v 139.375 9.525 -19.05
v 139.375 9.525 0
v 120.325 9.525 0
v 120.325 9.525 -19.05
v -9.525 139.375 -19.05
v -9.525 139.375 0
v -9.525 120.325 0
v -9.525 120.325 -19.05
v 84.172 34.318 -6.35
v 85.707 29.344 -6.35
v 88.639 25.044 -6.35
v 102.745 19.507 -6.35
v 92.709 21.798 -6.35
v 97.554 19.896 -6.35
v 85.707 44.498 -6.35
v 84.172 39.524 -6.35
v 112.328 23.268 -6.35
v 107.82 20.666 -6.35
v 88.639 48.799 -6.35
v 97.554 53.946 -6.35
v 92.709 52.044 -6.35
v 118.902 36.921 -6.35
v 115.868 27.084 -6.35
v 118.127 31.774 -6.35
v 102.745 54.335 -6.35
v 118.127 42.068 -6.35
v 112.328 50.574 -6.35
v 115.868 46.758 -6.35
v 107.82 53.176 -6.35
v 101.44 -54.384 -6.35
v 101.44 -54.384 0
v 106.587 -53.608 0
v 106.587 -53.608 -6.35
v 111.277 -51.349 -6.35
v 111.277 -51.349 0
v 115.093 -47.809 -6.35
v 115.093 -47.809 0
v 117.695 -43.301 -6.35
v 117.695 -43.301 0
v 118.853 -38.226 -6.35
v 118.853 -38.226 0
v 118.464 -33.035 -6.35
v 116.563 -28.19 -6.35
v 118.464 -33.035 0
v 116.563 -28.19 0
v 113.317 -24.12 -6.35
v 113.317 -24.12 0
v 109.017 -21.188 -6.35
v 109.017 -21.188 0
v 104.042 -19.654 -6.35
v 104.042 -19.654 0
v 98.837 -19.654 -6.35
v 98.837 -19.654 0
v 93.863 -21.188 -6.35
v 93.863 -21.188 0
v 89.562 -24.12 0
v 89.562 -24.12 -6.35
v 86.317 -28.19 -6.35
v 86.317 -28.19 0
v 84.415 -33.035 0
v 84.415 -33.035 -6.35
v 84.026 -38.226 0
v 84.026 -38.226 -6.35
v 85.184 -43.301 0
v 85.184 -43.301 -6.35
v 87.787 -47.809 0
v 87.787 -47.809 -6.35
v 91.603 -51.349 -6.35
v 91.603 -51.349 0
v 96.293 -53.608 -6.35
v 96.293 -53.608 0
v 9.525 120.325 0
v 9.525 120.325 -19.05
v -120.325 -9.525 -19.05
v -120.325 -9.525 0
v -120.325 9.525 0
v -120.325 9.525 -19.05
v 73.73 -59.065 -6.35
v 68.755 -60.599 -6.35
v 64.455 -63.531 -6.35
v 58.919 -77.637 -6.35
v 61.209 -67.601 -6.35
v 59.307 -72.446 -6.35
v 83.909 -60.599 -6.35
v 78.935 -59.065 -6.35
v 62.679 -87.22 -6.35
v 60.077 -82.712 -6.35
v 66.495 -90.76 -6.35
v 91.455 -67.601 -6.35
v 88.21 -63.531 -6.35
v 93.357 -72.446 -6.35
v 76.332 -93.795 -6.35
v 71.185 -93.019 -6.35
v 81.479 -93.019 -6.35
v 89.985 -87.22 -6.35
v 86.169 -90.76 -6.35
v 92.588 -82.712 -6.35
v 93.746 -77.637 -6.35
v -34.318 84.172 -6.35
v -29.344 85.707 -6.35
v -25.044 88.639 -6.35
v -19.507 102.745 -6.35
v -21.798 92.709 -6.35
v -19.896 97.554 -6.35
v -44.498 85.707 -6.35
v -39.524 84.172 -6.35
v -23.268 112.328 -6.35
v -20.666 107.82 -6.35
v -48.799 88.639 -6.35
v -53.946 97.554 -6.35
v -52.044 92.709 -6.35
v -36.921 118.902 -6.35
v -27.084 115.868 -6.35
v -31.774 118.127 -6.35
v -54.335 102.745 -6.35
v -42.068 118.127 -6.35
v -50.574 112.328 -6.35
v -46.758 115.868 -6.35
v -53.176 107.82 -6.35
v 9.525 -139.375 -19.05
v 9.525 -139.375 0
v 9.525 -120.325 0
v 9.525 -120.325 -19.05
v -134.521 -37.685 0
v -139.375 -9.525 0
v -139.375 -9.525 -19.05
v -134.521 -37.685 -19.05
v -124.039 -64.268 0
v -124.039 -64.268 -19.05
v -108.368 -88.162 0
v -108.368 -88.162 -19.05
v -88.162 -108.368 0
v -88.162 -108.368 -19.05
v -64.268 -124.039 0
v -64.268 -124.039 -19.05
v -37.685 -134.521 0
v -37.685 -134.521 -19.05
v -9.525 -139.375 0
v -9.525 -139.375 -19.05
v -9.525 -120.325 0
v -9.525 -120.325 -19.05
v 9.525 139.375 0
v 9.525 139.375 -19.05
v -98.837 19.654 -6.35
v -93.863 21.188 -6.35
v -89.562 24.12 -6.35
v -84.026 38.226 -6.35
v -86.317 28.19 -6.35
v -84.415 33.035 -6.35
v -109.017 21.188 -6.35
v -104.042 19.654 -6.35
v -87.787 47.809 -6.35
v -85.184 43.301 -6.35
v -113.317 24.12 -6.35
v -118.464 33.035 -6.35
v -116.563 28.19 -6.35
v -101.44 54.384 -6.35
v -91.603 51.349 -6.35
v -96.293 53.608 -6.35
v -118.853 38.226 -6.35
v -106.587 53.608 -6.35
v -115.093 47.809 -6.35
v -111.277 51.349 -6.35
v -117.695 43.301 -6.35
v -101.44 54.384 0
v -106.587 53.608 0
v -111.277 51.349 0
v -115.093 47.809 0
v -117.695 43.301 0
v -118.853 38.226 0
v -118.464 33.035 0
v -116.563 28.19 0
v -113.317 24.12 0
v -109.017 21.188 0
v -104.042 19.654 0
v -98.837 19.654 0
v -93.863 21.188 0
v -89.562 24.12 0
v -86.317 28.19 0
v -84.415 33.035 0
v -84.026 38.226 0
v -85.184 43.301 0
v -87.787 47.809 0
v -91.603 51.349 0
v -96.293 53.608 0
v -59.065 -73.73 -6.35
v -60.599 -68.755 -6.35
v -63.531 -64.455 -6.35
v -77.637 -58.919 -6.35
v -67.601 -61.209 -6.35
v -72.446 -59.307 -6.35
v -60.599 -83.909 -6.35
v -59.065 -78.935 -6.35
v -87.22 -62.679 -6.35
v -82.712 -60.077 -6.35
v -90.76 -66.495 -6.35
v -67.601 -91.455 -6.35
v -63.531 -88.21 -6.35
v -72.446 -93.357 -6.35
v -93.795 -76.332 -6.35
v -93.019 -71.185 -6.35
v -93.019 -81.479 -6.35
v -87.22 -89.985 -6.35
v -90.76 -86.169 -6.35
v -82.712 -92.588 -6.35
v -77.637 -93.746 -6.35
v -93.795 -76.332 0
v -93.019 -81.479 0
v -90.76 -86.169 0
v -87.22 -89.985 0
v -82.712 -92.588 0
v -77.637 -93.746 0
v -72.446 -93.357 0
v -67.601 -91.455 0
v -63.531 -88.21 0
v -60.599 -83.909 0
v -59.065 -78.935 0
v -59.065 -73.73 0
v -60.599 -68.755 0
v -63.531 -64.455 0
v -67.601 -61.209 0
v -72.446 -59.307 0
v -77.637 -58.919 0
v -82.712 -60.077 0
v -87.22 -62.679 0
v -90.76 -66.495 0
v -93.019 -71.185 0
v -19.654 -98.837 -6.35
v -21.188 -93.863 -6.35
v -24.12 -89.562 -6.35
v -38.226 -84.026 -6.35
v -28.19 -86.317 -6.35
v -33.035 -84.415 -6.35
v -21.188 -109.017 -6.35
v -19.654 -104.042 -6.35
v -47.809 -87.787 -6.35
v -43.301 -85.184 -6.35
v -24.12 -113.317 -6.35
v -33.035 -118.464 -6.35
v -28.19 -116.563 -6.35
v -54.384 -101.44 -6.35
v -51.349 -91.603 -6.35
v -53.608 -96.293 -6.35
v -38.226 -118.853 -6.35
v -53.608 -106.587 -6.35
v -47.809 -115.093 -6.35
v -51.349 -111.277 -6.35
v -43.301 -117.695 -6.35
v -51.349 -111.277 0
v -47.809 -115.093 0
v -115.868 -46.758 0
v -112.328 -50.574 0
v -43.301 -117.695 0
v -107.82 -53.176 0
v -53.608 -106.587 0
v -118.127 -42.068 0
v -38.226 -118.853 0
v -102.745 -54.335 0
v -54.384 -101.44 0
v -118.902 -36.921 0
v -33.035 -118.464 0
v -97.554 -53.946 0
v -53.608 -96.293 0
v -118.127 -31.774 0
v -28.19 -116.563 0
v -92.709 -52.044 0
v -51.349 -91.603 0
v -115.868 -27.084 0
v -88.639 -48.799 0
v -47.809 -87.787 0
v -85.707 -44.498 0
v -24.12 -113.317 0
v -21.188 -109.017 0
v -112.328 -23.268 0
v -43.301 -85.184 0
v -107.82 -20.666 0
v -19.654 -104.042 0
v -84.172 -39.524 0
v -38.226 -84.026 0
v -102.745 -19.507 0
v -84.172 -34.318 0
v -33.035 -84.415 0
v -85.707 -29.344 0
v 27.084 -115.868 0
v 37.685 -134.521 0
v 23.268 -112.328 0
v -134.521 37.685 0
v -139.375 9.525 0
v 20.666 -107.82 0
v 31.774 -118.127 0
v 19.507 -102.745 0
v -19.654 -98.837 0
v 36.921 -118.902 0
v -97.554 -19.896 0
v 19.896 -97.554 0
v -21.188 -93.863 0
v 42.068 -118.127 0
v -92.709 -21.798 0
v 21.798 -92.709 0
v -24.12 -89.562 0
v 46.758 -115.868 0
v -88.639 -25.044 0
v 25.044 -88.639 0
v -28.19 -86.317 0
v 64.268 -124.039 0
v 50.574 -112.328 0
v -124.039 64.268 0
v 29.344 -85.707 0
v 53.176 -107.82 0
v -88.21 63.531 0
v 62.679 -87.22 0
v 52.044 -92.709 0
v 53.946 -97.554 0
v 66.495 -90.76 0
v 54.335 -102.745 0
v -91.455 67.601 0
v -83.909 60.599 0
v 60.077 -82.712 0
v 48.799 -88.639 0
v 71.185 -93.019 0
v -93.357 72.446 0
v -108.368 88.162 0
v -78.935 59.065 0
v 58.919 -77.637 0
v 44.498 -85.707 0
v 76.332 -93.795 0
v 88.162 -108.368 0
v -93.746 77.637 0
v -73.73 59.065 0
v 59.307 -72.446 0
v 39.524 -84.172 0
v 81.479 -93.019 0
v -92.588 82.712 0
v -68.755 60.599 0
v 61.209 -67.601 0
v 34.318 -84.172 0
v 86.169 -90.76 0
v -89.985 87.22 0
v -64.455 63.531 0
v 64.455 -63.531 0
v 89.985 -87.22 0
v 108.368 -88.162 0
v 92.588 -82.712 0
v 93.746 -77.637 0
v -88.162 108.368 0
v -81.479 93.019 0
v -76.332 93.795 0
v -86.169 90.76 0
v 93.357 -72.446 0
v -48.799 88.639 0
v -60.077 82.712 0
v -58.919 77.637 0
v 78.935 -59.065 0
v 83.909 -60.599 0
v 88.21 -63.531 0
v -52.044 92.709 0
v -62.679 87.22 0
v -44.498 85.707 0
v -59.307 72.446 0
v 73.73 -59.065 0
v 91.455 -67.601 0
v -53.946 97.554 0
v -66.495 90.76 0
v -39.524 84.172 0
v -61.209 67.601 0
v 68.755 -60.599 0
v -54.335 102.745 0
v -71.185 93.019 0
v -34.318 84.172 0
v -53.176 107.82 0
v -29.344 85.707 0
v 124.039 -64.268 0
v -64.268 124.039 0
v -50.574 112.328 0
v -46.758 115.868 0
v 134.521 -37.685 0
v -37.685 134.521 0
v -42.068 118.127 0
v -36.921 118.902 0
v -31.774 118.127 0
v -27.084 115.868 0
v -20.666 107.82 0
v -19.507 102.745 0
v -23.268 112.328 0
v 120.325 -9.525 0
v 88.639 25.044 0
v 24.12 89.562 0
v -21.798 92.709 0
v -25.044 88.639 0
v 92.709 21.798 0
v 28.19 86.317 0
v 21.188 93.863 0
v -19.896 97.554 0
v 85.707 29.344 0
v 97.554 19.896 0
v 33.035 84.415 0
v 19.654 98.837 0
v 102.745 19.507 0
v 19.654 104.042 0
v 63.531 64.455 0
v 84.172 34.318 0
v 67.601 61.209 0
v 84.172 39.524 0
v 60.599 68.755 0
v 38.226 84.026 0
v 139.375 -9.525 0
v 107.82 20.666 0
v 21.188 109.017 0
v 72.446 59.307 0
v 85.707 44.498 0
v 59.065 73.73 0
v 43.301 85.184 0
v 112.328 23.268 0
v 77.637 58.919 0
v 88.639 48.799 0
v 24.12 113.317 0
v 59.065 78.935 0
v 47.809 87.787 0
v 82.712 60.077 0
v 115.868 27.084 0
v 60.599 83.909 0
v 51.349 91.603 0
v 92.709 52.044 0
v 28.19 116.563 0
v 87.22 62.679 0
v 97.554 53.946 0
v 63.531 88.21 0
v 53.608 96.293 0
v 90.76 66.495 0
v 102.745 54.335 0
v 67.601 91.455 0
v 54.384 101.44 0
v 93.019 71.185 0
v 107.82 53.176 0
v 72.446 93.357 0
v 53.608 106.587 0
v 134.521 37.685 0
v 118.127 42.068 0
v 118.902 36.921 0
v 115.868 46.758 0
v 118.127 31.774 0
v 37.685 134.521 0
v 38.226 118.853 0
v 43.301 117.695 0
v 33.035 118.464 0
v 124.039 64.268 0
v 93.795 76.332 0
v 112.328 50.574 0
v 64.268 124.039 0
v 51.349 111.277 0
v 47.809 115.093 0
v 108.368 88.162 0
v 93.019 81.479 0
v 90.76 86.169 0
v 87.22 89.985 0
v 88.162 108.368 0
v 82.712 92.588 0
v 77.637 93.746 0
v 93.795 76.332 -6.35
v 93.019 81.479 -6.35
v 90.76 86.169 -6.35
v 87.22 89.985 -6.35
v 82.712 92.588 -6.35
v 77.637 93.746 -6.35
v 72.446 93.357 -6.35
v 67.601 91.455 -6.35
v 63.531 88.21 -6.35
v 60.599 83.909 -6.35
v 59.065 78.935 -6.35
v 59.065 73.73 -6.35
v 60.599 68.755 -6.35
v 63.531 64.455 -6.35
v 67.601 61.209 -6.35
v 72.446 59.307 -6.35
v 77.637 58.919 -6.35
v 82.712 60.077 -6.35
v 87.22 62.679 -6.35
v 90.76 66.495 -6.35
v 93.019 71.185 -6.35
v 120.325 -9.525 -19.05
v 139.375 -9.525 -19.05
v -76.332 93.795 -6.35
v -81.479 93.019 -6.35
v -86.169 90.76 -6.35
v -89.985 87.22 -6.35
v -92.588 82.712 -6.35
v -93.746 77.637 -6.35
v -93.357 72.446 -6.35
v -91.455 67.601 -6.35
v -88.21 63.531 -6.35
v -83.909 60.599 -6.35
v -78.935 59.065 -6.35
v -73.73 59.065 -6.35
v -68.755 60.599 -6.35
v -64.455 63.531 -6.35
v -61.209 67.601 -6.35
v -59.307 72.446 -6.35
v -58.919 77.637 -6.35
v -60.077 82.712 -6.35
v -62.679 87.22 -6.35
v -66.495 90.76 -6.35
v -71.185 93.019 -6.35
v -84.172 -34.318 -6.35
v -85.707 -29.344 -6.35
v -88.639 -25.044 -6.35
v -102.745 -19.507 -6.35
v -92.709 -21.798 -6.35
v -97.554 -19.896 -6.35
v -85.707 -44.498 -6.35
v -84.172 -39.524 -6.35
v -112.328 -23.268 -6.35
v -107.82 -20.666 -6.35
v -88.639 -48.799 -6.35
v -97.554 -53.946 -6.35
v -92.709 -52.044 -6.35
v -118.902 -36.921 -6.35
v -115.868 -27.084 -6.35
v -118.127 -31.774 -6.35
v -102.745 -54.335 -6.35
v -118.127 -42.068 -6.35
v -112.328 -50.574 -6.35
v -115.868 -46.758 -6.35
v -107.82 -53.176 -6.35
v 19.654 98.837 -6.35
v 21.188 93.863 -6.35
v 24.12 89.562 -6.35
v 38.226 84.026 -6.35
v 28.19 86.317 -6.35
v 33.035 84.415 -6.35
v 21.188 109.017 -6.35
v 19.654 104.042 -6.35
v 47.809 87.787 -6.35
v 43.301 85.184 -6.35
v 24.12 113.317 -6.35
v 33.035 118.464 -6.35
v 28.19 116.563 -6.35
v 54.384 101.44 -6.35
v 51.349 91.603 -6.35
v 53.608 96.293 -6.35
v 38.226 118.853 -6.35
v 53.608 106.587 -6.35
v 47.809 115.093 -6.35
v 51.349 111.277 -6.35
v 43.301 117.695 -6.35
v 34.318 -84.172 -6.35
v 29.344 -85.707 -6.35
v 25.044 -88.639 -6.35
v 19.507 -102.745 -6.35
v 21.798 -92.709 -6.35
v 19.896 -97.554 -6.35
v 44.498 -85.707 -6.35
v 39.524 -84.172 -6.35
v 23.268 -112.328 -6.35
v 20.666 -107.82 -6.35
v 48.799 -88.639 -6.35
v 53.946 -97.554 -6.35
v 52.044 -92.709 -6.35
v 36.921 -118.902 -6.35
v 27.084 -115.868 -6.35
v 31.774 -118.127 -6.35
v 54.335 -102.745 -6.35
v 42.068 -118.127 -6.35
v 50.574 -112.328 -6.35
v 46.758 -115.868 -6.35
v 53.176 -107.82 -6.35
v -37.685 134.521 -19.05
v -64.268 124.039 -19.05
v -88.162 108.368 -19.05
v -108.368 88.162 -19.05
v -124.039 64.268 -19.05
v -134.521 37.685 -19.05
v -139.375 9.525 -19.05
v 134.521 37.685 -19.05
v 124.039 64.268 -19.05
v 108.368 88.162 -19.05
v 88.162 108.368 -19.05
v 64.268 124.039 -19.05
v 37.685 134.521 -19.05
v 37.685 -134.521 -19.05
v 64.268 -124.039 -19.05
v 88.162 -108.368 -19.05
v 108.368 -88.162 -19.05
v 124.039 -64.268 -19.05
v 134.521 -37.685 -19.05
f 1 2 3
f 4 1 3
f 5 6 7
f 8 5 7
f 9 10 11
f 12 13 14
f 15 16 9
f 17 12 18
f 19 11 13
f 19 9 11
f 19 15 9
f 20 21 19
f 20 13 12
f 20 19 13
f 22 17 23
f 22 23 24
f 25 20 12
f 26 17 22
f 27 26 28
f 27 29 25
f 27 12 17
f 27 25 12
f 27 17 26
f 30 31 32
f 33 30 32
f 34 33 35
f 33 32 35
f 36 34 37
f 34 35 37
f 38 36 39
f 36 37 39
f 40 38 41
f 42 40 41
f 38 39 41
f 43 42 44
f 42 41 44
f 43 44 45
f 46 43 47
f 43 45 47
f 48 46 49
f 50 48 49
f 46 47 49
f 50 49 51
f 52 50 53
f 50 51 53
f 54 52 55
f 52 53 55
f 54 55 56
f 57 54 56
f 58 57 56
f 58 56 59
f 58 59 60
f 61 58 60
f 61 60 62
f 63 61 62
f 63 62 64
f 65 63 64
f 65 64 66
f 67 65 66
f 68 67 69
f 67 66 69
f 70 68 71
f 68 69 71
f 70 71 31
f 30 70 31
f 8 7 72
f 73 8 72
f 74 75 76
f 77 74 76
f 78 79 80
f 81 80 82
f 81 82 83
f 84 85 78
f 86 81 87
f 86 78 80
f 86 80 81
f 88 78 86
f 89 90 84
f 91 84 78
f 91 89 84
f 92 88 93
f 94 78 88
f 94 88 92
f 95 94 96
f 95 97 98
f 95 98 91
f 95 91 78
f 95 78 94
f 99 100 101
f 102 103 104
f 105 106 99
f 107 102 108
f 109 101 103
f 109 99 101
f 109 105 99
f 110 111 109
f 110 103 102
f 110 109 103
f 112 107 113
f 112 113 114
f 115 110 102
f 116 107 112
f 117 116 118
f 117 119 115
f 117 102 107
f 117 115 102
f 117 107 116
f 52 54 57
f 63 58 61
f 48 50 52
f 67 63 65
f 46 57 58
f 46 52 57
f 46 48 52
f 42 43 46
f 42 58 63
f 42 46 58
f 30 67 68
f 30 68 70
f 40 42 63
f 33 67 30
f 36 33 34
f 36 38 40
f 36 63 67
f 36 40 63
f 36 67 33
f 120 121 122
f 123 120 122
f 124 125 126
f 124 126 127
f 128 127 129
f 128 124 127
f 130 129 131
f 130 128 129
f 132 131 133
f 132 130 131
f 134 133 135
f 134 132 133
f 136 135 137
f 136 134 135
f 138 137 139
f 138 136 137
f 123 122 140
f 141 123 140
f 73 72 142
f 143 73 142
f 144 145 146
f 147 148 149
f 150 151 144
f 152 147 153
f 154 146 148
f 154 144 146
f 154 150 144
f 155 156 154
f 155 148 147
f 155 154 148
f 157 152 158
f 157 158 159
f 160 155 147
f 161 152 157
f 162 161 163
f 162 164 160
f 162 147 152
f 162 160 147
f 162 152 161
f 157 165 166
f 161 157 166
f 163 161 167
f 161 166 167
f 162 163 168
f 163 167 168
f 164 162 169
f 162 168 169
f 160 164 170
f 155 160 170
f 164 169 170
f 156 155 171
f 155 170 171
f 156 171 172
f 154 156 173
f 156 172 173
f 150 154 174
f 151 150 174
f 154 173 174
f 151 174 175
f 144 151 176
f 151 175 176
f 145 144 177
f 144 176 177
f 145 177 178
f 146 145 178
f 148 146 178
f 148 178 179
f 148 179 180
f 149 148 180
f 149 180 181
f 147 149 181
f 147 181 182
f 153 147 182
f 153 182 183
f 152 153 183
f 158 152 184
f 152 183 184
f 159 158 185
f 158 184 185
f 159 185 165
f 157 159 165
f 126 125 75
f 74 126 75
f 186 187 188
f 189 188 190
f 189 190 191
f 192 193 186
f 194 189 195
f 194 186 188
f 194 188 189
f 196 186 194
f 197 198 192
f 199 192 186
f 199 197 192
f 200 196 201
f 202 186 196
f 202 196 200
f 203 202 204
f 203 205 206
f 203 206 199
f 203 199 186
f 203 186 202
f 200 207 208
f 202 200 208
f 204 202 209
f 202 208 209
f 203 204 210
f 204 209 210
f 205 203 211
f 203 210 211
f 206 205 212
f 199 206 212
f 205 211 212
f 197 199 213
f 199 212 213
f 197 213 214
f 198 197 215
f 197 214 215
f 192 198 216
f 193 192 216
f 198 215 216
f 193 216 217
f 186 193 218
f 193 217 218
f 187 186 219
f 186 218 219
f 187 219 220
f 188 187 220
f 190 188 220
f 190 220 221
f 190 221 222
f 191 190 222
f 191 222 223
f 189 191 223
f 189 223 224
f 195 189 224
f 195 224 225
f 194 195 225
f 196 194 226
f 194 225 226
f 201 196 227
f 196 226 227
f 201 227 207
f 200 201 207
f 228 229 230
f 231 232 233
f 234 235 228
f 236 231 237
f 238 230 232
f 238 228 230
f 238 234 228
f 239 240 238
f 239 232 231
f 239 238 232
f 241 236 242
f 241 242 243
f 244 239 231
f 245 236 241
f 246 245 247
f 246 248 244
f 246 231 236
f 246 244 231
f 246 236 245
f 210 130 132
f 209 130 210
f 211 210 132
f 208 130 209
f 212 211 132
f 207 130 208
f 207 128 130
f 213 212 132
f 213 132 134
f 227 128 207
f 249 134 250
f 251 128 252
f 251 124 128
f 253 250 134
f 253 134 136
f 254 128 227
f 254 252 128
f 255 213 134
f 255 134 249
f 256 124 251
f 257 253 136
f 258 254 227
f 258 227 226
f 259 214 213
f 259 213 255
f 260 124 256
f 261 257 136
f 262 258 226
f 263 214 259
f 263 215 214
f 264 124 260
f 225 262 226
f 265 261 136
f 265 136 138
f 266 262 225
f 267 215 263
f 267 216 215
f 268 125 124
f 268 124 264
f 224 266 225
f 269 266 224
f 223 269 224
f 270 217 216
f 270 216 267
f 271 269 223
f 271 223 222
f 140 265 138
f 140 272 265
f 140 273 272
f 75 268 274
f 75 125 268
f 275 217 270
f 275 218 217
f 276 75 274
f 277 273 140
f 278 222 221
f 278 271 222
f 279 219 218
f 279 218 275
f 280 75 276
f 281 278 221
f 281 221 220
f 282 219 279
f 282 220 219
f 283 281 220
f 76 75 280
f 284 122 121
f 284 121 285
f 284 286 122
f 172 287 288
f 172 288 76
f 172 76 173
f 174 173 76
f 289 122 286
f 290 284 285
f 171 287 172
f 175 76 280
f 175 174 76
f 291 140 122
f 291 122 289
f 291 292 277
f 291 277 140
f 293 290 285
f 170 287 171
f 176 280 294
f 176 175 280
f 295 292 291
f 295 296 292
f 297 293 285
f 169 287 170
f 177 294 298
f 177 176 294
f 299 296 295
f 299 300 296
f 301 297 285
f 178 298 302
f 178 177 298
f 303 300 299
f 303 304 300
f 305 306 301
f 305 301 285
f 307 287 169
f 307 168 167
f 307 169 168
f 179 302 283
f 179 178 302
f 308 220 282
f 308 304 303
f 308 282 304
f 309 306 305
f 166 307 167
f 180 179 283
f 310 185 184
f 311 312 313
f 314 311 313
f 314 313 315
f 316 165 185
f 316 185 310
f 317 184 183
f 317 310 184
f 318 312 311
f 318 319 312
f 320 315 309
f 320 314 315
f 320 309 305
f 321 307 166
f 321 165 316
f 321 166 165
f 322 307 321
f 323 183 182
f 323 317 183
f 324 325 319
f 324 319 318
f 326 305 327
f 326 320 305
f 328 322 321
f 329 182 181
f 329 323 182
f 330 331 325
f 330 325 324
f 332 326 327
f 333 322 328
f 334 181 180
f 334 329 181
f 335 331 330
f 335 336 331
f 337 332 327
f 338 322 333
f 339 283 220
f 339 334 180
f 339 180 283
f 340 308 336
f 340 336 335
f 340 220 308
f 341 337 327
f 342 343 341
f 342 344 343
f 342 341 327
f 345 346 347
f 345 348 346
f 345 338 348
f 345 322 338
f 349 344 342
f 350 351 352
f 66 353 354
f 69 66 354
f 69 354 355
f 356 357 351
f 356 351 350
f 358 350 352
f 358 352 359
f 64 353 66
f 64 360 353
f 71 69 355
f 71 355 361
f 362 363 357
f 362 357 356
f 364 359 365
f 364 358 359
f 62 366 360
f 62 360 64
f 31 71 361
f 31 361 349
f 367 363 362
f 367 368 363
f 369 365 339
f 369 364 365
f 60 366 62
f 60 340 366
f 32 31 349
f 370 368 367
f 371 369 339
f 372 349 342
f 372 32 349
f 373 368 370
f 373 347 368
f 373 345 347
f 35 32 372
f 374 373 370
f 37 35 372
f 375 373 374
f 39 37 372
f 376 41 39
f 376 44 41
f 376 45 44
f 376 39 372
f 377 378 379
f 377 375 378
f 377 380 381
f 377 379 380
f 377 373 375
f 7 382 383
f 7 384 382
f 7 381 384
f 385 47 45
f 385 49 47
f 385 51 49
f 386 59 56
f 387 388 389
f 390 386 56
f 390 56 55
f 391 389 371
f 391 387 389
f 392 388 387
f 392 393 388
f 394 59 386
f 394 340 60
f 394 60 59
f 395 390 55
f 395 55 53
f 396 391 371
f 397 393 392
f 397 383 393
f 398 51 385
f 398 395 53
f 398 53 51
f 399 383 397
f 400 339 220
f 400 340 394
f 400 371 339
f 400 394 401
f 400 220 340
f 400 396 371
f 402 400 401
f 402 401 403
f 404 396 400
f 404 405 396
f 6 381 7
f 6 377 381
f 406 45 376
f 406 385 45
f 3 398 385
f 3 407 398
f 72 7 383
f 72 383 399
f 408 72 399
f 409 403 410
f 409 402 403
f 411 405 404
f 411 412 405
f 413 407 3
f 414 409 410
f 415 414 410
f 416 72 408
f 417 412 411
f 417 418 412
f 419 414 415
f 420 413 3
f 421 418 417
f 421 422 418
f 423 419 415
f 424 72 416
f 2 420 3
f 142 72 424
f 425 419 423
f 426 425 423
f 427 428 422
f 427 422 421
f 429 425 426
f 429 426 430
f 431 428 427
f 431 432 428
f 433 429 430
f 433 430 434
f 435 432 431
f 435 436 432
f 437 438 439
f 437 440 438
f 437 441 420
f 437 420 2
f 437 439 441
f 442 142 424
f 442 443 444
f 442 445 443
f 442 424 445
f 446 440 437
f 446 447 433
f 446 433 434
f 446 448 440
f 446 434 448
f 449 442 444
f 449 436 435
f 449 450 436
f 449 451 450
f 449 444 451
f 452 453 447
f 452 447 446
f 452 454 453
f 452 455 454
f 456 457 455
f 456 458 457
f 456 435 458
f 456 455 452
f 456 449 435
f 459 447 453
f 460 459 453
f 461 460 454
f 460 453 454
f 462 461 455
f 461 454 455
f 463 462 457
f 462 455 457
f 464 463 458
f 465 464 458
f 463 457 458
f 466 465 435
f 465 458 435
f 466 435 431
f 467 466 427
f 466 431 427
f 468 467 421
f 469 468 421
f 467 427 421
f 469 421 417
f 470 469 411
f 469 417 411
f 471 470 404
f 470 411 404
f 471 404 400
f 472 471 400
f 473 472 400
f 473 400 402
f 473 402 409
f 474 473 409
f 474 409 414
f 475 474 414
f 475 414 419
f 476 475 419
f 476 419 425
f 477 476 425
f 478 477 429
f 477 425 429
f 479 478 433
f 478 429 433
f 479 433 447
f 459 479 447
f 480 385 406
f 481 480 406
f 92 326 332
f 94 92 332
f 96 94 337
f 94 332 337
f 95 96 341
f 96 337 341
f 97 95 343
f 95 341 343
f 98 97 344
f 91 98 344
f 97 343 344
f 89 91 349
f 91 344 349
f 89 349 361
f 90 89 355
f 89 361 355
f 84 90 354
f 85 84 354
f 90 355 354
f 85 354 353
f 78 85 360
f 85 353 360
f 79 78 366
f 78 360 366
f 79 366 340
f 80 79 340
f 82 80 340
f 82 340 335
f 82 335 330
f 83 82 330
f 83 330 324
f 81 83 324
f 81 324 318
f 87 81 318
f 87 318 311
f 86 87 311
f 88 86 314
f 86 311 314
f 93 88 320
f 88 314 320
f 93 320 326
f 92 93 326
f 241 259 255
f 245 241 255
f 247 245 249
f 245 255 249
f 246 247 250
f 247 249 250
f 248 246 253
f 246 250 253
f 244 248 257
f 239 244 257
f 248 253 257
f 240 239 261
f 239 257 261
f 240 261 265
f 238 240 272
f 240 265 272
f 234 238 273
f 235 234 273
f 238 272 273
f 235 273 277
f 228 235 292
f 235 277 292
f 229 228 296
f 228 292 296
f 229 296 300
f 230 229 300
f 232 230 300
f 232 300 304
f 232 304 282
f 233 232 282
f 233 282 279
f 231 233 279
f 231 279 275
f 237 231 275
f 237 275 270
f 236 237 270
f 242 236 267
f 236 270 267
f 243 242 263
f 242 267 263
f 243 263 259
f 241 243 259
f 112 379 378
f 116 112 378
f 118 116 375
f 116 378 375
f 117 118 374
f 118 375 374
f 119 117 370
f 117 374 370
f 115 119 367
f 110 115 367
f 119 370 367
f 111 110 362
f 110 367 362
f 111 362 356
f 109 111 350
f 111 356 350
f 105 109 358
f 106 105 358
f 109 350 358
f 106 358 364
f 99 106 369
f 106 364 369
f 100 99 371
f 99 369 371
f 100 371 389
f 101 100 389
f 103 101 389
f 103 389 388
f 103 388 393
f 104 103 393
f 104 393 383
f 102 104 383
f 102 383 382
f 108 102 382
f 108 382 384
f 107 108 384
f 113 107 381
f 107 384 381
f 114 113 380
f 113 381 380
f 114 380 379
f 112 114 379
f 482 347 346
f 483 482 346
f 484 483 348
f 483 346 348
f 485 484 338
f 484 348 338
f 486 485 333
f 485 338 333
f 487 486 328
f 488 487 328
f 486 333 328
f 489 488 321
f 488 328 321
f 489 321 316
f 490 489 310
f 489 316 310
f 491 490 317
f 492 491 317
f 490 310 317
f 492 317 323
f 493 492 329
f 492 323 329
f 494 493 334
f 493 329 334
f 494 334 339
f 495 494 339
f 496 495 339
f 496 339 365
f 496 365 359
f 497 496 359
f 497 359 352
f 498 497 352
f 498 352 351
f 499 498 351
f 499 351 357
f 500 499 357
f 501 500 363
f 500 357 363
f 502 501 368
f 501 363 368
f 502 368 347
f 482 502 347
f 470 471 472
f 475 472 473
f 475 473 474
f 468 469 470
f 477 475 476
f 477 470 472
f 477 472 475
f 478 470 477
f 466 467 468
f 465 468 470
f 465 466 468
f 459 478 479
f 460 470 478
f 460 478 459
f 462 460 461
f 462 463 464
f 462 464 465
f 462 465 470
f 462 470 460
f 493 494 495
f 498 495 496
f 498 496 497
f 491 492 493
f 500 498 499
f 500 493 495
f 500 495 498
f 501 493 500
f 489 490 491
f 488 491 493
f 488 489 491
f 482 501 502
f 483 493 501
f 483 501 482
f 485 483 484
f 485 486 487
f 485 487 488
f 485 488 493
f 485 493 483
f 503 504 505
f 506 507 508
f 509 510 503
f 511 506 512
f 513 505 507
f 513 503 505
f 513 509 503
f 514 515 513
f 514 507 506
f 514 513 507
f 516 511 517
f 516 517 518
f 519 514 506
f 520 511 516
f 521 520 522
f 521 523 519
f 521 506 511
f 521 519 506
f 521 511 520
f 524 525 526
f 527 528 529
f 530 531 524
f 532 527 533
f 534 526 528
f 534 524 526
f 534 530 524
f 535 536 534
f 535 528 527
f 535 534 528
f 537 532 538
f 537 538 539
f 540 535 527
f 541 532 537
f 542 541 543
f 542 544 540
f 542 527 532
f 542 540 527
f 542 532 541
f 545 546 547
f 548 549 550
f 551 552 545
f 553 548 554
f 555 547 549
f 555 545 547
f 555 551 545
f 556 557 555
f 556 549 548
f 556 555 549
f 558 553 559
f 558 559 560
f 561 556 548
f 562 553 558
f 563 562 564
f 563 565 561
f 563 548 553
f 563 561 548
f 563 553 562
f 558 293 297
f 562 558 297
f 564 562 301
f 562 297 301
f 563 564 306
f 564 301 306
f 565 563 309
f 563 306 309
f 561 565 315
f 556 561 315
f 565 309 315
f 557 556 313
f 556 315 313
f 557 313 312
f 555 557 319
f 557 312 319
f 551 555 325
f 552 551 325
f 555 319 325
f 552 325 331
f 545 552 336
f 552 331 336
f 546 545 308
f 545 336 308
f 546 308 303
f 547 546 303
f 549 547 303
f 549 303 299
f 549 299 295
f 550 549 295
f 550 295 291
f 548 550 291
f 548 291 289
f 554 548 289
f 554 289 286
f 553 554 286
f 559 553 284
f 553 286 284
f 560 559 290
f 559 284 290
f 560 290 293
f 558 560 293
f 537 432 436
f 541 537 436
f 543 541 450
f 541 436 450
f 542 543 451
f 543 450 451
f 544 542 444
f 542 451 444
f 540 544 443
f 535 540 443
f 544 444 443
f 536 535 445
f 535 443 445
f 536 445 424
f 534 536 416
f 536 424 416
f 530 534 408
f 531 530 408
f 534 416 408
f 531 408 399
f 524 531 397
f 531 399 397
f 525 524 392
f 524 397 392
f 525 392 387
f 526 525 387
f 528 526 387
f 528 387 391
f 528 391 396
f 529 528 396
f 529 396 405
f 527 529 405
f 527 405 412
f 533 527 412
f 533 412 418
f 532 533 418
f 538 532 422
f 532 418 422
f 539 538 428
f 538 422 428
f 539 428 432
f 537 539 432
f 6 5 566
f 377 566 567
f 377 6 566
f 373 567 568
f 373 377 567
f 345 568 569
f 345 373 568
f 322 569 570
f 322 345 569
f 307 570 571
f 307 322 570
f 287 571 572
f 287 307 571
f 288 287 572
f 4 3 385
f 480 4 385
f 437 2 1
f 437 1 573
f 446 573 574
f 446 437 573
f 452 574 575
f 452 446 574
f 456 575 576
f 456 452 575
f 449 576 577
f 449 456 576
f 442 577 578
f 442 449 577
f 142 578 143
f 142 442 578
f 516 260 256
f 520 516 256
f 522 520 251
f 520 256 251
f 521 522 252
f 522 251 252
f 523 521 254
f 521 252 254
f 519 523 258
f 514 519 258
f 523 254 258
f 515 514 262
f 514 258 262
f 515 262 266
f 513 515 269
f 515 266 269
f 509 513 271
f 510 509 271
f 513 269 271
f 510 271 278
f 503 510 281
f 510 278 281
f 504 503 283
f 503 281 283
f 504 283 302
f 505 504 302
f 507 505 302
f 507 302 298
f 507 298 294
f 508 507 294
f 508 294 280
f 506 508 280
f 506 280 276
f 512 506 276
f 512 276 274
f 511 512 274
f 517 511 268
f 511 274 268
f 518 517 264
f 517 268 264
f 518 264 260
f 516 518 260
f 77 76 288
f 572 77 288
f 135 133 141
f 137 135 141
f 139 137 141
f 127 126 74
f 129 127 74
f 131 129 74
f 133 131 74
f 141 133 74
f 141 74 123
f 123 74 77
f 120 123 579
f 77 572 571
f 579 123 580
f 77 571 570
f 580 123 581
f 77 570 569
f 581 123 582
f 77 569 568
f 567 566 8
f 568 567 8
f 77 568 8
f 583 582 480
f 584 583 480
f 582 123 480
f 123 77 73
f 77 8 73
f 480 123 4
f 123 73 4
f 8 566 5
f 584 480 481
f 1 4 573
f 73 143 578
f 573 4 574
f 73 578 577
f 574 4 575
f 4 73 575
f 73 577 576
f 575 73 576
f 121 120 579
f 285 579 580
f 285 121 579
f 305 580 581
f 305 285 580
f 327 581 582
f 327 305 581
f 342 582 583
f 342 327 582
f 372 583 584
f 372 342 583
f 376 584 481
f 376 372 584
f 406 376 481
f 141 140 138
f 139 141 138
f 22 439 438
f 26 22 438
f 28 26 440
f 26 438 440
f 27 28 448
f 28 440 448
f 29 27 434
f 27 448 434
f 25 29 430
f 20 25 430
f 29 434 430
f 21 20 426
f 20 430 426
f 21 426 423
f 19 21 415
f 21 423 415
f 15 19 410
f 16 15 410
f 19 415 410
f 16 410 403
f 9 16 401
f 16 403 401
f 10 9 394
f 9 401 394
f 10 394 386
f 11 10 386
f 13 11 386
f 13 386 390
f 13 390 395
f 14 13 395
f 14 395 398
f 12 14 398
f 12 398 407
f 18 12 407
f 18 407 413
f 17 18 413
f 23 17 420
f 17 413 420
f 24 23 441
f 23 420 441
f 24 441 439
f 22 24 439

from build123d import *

# Parameters (mm, degrees)
F0_R            = 17.4625
F0_W            = 19.05
F0_H            = 6.35
F1_DEPTH        = 19.05
F2_DEPTH        = 6.35
F2_COPIES_COUNT = 4
F3_DEPTH        = 19.051
F3_COPIES_COUNT = 4


# Not quite as in the source:
# - a pattern or mirror of a feature is missing from the dataset's text; its kind, count and spacing are read off the source's solid


with BuildPart() as f1:
    # F0 (on Top) → F1 (new body)
    with BuildSketch(Plane.XY):
        with BuildLine():
            ThreePointArc((-9.525, 139.3749058296), (-95.3557746023, -102.0948884617), (139.7, 0))
            ThreePointArc((139.7, 0), (102.0948884617, 95.3557746023), (9.525, 139.3749058296))
            Line((9.525, 139.3749058296), (9.525, 120.3249058296))
            Line((9.525, 120.3249058296), (9.525, 113.9749058296))
            Line((9.525, 113.9749058296), (-9.525, 113.9749058296))
            Line((-9.525, 113.9749058296), (-9.525, 120.3249058296))
            Line((-9.525, 120.3249058296), (-9.525, 139.3749058296))
        make_face()
        with Locations((101.4398184138, 36.921074472)):
            Circle(F0_R, mode=Mode.SUBTRACT)
        with Locations((36.921074472, 101.4398184138)):
            Circle(F0_R, mode=Mode.SUBTRACT)
        with Locations((76.3321770291, 76.3321770291)):
            Circle(F0_R, mode=Mode.SUBTRACT)
        with BuildLine():
            Line((9.525, 120.3249058296), (9.525, 139.3749058296))
            ThreePointArc((9.525, 139.3749058296), (0, 139.7), (-9.525, 139.3749058296))
            Line((-9.525, 139.3749058296), (-9.525, 120.3249058296))
            Line((-9.525, 120.3249058296), (9.525, 120.3249058296))
        make_face()
        with Locations((36.921074472, 101.4398184138)):
            Circle(F0_R)
        with Locations((76.3321770291, 76.3321770291)):
            Circle(F0_R)
        with Locations((101.4398184138, 36.921074472)):
            Circle(F0_R)
        with Locations((0, 117.1499058296)):
            Rectangle(F0_W, F0_H)
    extrude(amount=-F1_DEPTH)

    # F0 (on Top) → F2 (cut)
    with BuildSketch(Plane.XY):
        with Locations((36.921074472, 101.4398184138)):
            Circle(F0_R)
        with Locations((76.3321770291, 76.3321770291)):
            Circle(F0_R)
        with Locations((101.4398184138, 36.921074472)):
            Circle(F0_R)
    f2 = extrude(amount=-F2_DEPTH, mode=Mode.SUBTRACT)

    # F2_copies: F2 ×4 about axis
    f2_copies_axis = Axis((0, 0, 0), (0, 0, 1))
    for i in range(1, F2_COPIES_COUNT):
        add(f2.rotate(f2_copies_axis, i * 360 / F2_COPIES_COUNT), mode=Mode.SUBTRACT)

    # F0 (on Top) → F3 (cut, through all)
    with BuildSketch(Plane.XY):
        with BuildLine():
            Line((9.525, 120.3249058296), (9.525, 139.3749058296))
            ThreePointArc((9.525, 139.3749058296), (0, 139.7), (-9.525, 139.3749058296))
            Line((-9.525, 139.3749058296), (-9.525, 120.3249058296))
            Line((-9.525, 120.3249058296), (9.525, 120.3249058296))
        make_face()
    f3 = extrude(amount=-F3_DEPTH, mode=Mode.SUBTRACT)

    # F3_copies: F3 ×4 about axis
    f3_copies_axis = Axis((0, 0, 0), (0, 0, 1))
    for i in range(1, F3_COPIES_COUNT):
        add(f3.rotate(f3_copies_axis, i * 360 / F3_COPIES_COUNT), mode=Mode.SUBTRACT)


solid = f1.part
